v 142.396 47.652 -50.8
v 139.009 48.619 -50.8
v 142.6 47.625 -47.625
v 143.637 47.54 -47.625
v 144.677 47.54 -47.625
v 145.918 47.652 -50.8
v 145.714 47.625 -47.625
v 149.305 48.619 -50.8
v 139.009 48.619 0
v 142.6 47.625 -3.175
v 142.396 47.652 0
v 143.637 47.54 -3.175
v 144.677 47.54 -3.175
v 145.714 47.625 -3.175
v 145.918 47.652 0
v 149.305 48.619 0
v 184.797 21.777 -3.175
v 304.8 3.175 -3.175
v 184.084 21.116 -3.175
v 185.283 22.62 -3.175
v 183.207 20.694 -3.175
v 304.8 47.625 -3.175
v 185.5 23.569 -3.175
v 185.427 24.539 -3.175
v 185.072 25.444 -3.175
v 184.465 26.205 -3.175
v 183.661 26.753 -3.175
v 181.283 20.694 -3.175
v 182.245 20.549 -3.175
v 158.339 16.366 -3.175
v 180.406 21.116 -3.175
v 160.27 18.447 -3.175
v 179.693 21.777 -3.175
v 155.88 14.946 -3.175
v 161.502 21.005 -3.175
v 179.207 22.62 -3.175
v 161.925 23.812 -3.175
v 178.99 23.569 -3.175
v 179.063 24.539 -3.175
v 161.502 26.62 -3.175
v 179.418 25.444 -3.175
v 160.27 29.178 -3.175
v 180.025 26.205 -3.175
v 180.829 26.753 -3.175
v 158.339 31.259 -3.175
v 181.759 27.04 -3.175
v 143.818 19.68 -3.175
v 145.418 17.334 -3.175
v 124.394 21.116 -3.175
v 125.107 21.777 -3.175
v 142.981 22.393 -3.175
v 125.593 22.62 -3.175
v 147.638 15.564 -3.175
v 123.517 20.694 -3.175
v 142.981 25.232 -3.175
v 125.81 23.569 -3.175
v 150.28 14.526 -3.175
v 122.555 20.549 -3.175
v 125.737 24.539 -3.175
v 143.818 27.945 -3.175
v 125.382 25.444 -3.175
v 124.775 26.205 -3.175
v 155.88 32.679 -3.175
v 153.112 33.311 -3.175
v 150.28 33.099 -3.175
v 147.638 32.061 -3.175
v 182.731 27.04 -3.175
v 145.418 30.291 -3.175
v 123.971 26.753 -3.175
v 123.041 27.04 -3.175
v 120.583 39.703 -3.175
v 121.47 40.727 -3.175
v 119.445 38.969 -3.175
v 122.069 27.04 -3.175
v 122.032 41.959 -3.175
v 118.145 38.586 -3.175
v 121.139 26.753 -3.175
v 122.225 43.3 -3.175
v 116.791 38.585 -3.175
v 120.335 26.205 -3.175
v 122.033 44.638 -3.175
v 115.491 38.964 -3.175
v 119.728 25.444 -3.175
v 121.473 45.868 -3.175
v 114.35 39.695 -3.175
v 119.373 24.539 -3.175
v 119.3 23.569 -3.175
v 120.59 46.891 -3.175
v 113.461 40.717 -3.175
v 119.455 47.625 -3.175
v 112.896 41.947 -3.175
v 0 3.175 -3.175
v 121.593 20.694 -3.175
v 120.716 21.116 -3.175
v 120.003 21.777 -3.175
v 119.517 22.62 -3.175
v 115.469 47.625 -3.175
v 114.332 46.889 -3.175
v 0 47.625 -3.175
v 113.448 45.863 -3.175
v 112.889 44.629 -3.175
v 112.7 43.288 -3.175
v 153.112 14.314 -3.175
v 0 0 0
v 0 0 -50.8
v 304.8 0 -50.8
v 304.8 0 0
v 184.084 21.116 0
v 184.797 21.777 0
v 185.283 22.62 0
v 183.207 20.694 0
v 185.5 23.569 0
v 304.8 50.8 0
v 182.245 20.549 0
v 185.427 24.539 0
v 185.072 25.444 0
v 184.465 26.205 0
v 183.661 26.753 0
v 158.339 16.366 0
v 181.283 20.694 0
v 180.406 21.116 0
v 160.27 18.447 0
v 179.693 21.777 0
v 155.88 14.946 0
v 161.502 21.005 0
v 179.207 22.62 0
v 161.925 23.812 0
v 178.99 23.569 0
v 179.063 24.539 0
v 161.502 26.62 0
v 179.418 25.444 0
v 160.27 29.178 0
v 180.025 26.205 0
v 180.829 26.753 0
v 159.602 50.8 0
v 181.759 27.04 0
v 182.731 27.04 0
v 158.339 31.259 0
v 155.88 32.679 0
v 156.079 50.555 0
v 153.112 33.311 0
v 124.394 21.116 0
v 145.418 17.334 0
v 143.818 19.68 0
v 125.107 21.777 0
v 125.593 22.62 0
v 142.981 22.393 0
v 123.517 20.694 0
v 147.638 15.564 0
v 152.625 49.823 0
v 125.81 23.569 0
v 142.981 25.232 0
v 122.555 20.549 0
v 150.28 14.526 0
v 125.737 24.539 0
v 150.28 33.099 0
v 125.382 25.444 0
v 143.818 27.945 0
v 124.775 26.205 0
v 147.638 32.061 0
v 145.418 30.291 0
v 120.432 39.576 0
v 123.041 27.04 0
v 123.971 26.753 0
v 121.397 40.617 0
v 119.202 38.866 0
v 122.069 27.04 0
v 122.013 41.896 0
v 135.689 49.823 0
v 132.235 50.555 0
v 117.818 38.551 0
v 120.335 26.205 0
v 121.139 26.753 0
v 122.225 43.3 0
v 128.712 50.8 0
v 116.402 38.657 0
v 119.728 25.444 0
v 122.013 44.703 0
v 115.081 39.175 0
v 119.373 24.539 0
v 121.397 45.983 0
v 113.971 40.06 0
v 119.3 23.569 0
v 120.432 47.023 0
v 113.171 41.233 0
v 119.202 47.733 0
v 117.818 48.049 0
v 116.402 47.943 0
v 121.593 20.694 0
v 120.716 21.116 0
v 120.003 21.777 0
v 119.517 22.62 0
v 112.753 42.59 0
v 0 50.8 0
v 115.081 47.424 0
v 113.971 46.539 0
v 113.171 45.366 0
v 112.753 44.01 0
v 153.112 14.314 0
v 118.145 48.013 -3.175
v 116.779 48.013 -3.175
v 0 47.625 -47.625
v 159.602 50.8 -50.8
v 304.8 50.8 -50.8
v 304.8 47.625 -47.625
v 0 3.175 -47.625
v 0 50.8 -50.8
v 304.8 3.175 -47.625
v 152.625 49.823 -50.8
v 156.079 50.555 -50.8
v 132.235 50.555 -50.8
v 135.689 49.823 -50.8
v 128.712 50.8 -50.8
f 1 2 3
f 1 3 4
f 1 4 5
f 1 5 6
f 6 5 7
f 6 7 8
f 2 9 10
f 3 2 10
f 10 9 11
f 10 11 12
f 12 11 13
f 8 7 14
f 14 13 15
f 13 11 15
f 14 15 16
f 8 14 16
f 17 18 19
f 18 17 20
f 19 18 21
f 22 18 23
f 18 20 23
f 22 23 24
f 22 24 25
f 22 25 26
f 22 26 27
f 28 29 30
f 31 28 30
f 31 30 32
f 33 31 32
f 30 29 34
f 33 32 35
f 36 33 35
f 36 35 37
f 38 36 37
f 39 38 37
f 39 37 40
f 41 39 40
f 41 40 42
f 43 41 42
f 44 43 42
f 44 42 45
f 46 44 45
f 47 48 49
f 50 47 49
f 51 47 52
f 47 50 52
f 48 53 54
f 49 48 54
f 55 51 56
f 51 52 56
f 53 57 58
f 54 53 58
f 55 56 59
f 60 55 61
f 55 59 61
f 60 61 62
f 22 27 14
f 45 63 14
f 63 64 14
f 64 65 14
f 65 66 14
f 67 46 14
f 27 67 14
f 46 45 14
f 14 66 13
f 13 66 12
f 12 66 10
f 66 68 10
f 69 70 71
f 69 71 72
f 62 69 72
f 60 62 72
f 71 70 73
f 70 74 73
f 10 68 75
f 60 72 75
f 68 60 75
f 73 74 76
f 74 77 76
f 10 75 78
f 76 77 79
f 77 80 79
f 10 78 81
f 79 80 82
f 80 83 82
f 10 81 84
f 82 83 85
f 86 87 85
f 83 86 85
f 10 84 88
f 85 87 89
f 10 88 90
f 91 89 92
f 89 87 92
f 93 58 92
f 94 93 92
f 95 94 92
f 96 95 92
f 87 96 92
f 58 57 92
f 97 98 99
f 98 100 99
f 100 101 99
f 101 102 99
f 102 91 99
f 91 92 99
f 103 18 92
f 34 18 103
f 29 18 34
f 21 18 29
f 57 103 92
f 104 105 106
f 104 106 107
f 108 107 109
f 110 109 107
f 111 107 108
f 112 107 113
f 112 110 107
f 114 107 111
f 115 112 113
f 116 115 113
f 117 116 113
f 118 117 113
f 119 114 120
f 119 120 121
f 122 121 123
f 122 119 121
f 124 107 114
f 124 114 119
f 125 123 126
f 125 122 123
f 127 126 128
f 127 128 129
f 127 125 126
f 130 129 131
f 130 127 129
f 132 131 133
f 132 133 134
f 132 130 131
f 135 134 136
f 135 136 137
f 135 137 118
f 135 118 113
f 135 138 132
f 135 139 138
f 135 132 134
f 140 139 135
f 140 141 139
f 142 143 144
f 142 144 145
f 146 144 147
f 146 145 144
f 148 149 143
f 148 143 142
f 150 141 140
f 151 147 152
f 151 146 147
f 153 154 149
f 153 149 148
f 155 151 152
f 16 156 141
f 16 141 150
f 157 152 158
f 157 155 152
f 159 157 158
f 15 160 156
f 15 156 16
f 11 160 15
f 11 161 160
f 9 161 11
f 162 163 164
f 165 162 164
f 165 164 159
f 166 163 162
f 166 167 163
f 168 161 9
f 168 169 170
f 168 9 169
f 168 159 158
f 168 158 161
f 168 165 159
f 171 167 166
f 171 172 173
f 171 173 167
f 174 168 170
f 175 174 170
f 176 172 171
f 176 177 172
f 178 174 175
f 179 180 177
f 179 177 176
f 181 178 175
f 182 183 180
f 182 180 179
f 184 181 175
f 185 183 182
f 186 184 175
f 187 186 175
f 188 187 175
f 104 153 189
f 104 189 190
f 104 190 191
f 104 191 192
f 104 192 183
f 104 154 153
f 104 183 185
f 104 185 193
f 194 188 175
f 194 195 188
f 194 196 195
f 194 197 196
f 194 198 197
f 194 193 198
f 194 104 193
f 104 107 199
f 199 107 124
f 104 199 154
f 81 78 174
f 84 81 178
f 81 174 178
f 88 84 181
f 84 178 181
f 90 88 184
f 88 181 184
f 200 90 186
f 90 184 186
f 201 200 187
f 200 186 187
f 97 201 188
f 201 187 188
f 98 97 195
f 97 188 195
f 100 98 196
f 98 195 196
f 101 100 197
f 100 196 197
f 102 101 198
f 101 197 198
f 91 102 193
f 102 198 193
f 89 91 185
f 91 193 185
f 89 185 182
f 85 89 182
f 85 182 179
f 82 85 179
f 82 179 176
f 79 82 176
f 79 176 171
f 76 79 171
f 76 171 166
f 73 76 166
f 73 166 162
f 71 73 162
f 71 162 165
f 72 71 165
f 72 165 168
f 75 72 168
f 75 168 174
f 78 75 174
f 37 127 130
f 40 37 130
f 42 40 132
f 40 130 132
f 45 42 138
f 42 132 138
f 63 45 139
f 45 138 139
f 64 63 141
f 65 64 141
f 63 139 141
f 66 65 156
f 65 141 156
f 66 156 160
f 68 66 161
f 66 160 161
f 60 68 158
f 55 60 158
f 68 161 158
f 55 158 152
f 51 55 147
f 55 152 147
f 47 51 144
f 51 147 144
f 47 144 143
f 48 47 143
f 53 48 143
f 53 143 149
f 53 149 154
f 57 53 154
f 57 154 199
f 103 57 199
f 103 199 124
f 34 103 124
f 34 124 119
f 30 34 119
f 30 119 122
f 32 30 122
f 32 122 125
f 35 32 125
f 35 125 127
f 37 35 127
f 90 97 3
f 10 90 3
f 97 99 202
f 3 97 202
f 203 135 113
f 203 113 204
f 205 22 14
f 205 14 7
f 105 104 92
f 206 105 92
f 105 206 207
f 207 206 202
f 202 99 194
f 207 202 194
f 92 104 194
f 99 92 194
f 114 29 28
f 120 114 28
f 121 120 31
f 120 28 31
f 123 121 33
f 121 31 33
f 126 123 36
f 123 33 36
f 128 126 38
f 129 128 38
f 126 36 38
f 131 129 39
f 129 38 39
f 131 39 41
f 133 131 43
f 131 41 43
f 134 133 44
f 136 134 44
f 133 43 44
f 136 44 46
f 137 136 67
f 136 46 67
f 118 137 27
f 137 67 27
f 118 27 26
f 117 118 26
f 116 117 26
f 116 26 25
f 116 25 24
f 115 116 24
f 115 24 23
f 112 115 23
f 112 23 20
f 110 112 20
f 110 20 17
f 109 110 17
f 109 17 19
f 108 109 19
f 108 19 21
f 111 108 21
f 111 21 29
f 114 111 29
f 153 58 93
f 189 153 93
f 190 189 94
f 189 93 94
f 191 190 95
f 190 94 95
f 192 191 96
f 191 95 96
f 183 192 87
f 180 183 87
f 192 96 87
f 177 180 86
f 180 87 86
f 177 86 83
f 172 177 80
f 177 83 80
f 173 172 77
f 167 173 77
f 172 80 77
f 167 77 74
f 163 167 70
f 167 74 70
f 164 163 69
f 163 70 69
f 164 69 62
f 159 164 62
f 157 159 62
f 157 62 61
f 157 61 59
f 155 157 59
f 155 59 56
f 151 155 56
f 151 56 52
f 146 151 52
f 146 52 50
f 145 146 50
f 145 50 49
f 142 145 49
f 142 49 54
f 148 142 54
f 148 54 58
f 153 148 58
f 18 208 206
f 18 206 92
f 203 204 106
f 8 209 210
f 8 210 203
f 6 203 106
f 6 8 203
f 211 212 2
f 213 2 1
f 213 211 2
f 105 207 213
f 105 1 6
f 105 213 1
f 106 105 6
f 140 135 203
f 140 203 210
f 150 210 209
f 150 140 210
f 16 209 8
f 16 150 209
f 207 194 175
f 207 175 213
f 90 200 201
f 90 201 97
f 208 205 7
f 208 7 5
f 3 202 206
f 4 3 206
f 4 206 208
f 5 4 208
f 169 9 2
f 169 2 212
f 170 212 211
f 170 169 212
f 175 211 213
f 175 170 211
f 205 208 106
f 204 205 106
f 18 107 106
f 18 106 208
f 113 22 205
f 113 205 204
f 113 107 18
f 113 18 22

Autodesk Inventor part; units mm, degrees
ref_plane "YZ Plane" through (0, 0, 0) normal (1, 0, 0) x (0, 1, 0)
ref_plane "XZ Plane" through (0, 0, 0) normal (0, 1, 0) x (-1, 0, 0)
ref_plane "XY Plane" through (0, 0, 0) normal (0, 0, 1) x (1, 0, 0)
sketch "Main Outline" plane through (0, 0, 0) normal (0, 0, 1) x (1, 0, 0)
  line L0 (0, 0) -> (304.8, 0) construction
  line L1 (304.8, 0) -> (304.8, 50.8) construction
  line L2 (304.8, 50.8) -> (0, 50.8) construction
  line L3 (0, 50.8) -> (0, 0) construction
  line L4 (0, 50.8) -> (0, 53.34) construction
  line L5 (0, 53.34) -> (304.8, 53.34) construction
  line L6 (304.8, 53.34) -> (304.8, 50.8) construction
  circle A0 centre (152.4, 23.8125) radius 17.4625 construction
  line L7 (152.4, 23.8125) -> (152.4, 0) construction
  circle A1 centre (152.4, 23.8125) radius 27.94 construction
  circle A2 centre (152.4, 23.8125) radius 21.59 construction
  line L8 (152.4, 23.8125) -> (144.1569, 60.2292) construction
  circle A3 centre (144.1569, 60.2292) radius 15.24 construction
  circle A4 centre (144.1569, 60.2292) radius 8.89 construction
  circle A5 centre (144.1569, 60.2292) radius 14.2875 construction
  arc A6 (163.8162, 72.0089) -> (128.198, 43.7805) centre (144.1569, 60.2292) ccw construction
  circle A7 centre (98.8106, 85.598) radius 32.258 construction
  circle A8 centre (124.5097, 147.0273) radius 32.258 construction
  circle A9 centre (174.158, 102.6533) radius 32.258 construction
  circle A10 centre (144.1569, 60.2292) radius 11.1125 construction
  circle A11 centre (152.4, 23.8125) radius 49.53 construction
  line L9 (144.1569, 60.2292) -> (124.5097, 147.0273) construction
  line L10 (144.1569, 60.2292) -> (98.8106, 85.598) construction
  line L11 (98.8106, 85.598) -> (174.158, 102.6533) construction
  line L12 (174.158, 102.6533) -> (144.1569, 60.2292) construction
  circle A12 centre (98.8106, 85.598) radius 9.5493 construction
  arc A13 (172.0498, 111.9669) -> (183.1109, 99.3313) centre (174.158, 102.6533) ccw construction
  circle A14 centre (124.5097, 147.0273) radius 9.5493 construction
  line L13 (96.7024, 94.9117) -> (172.0498, 111.9669) construction
  line L14 (183.1109, 99.3313) -> (165.6438, 52.2565) construction
  line L15 (92.161, 78.7444) -> (128.198, 43.7805) construction
  line L16 (172.0498, 111.9669) -> (174.158, 102.6533) construction
  line L17 (174.158, 102.6533) -> (183.1109, 99.3313) construction
  arc A15 (183.1109, 99.3313) -> (172.0498, 111.9669) centre (174.158, 102.6533) ccw construction
  arc A16 (165.6438, 52.2565) -> (163.8162, 72.0089) centre (144.1569, 60.2292) ccw construction
  arc A17 (128.198, 43.7805) -> (165.6438, 52.2565) centre (144.1569, 60.2292) ccw construction
  circle A18 centre (124.4396, 147.337) radius 32.258 construction
  circle A19 centre (124.3695, 147.6466) radius 32.258 construction
  circle A20 centre (124.2994, 147.9563) radius 32.258 construction
  line L18 (124.5097, 147.0273) -> (124.2994, 147.9563) construction
  circle A21 centre (124.5798, 146.7176) radius 32.258 construction
  circle A22 centre (117.4622, 43.2997) radius 9.525 construction
  circle A23 centre (175.54, 56.4459) radius 9.525 construction
  line L19 (152.4, 23.8125) -> (117.4622, 43.2997) construction
  line L20 (152.4, 23.8125) -> (175.54, 56.4459) construction
  line L21 (117.4622, 43.2997) -> (98.8106, 85.598) construction
  line L22 (175.54, 56.4459) -> (174.158, 102.6533) construction
  circle A24 centre (133.7342, 106.2753) radius 7.9375 construction
  line L23 (133.401, 150.5107) -> (165.496, 68.5894) construction
  circle A25 centre (152.4, 23.8125) radius 29.845 construction
  line L24 (114.985, 146.3422) -> (121.2977, 58.5849) construction
  circle A26 centre (99.0876, 85.443) radius 32.258 construction
  circle A27 centre (97.9793, 86.063) radius 32.258 construction
  line L25 (97.9793, 86.063) -> (98.8106, 85.598) construction
  circle A28 centre (98.2564, 85.908) radius 32.258 construction
  circle A29 centre (98.5335, 85.753) radius 32.258 construction
  circle A30 centre (152.4, 23.8125) radius 29.845 construction
  circle A31 centre (122.555, 23.8125) radius 6.35 construction
  circle A32 centre (179.3358, 36.6651) radius 6.35 construction
  line L26 (122.555, 23.8125) -> (152.4, 23.8125) construction
  line L27 (152.4, 23.8125) -> (182.245, 23.8125) construction
  circle A33 centre (182.245, 23.8125) radius 6.35 construction
  circle A34 centre (125.4642, 10.9599) radius 6.35 construction
  circle A35 centre (150.1885, 33.5827) radius 39.8623 construction
  line L28 (72.8944, 65.7819) -> (119.1902, 8.5205) construction
  circle A36 centre (174.708, 103.431) radius 32.258 construction
  line L29 (174.158, 102.6533) -> (174.708, 103.431) construction
  circle A37 centre (174.5246, 103.1717) radius 32.258 construction
  circle A38 centre (174.3413, 102.9125) radius 32.258 construction
  circle A39 centre (173.9747, 102.394) radius 32.258 construction
  line L30 (188.958, 24.3128) -> (206.0816, 95.9295) construction
  circle A40 centre (133.7342, 106.2753) radius 8.1693 construction
  arc A41 (85.4541, 115.7901) -> (94.2274, 135.7949) centre (79.2901, 130.4196) ccw construction
  arc A42 (156.6774, 149.9308) -> (173.2104, 135.6542) centre (172.4734, 151.5121) ccw construction
  line L31 (124.2994, 147.9563) -> (124.8602, 145.479) construction
  line L32 (114.3901, 145.7133) -> (114.9509, 143.236) construction
  line L33 (134.7695, 147.722) -> (134.2088, 150.1993) construction
  arc A43 (134.2088, 150.1993) -> (114.3901, 145.7133) centre (124.2994, 147.9563) ccw construction
  arc A44 (114.9509, 143.236) -> (134.7695, 147.722) centre (124.8602, 145.479) ccw construction
  line L34 (174.708, 103.431) -> (173.2414, 101.3571) construction
  line L35 (166.4126, 109.2972) -> (164.9461, 107.2234) construction
  line L36 (181.5368, 95.4909) -> (183.0033, 97.5647) construction
  arc A45 (183.0033, 97.5647) -> (166.4126, 109.2972) centre (174.708, 103.431) ccw construction
  arc A46 (164.9461, 107.2234) -> (181.5368, 95.4909) centre (173.2414, 101.3571) ccw construction
  line L37 (97.9793, 86.063) -> (100.196, 84.8229) construction
  line L38 (93.0188, 77.1963) -> (95.2355, 75.9562) construction
  line L39 (105.1564, 93.6897) -> (102.9398, 94.9298) construction
  arc A47 (102.9398, 94.9298) -> (93.0188, 77.1963) centre (97.9793, 86.063) ccw construction
  arc A48 (95.2355, 75.9562) -> (105.1564, 93.6897) centre (100.196, 84.8229) ccw construction
  circle A49 centre (117.4622, 43.2997) radius 3.9687 construction
  circle A50 centre (175.54, 56.4459) radius 3.9687 construction
  line L40 (152.4, 23.8125) -> (158.9889, -5.2961) construction
  arc A51 (89.3511, 54.6895) -> (85.9237, 49.6664) centre (88.3927, 51.6626) ccw construction
  arc A52 (201.2624, 75.7739) -> (196.006, 78.8314) centre (198.1744, 76.5122) ccw construction
  circle A53 centre (152.4, 23.8125) radius 14.224 construction
  circle A54 centre (133.7342, 106.2753) radius 3.9687 construction
  circle A55 centre (156.886, 3.9939) radius 6.35 construction
  circle A56 centre (156.886, 3.9939) radius 2.0828 construction
  circle A57 centre (152.4, 23.8125) radius 20.32 construction
  line L41 (132.9935, 29.8368) -> (152.4, 23.8125) construction
  line L42 (152.4, 23.8125) -> (167.3204, 37.6068) construction
  circle A58 centre (167.3204, 37.6068) radius 2.0828 construction
  circle A59 centre (167.3204, 37.6068) radius 3.9687 construction
  circle A60 centre (132.9935, 29.8368) radius 2.0828 construction
  circle A61 centre (132.9935, 29.8368) radius 3.9688 construction
  point P0 (173.9747, 102.394)
  point P1 (99.0876, 85.443)
  dimension "d18" = 99.06
  dimension "d58" = 64.516
  dimension "d86" = 64.516
  dimension "d0" = 304.8
  dimension "d1" = 50.8
  dimension "d2" = 2.54
  dimension "d3" = 34.925
  dimension "d4" = 23.8125
  dimension "d5" = 152.4
  dimension "d6" = 55.88
  dimension "d7" = 43.18
  dimension "d8" = 37.338
  dimension "d10" = 30.48
  dimension "d11" = 17.78
  dimension "d12" = 28.575
  dimension "d13" = 45.8366
  dimension "d14" = 64.516
  dimension "d15" = 64.516
  dimension "d16" = 64.516
  dimension "d17" = 22.225
  dimension "d19" = 51.9602
  dimension "d20" = 88.9939
  dimension "d21" = 19.0986
  dimension "d22" = 19.0986
  dimension "d23" = 19.0986
  dimension "d30" = 123.112
  dimension "d40" = 64.516
  dimension "d41" = 64.516
  dimension "d42" = 64.516
  dimension "d43" = 0.9525
  dimension "d44" = 0.3175
  dimension "d45" = 0.635
  dimension "d46" = 64.516
  dimension "d47" = 0.3175
  dimension "d48" = 19.05
  dimension "d49" = 19.05
  dimension "d50" = 40.005
  dimension "d51" = 40.005
  dimension "d52" = 46.228
  dimension "d54" = 46.228
  dimension "d55" = 15.875
  dimension "d56" = 41.4655
  dimension "d57" = 59.69
  dimension "d59" = 64.516
  dimension "d60" = 64.516
  dimension "d61" = 64.516
  dimension "d62" = 0.3175
  dimension "d63" = 0.3175
  dimension "d64" = 0.635
  dimension "d65" = 0.9525
  dimension "d73" = 12.7
  dimension "d74" = 12.7
  dimension "d76" = 59.69
  dimension "d78" = 12.7
  dimension "d79" = 12.7
  dimension "d80" = 64.516
  dimension "d81" = 0.9525
  dimension "d82" = 64.516
  dimension "d83" = 64.516
  dimension "d84" = 0.3175
  dimension "d85" = 0.635
  dimension "d88" = 0.3175
  dimension "d89" = 31.75
  dimension "d90" = 31.75
  dimension "d94" = 1.5875
  dimension "d95" = 20.32
  dimension "d96" = 1.5875
sketch "Upper CIM C-C Check" plane through (0, 0, 0) normal (0, 0, 1) x (1, 0, 0)
  arc A0 (3.4429, -22.6582) -> (3.4429, 22.6582) centre (0, 0) ccw construction
  arc A1 (90.4285, 9.4409) -> (90.4285, -9.4409) centre (88.9939, 0) ccw construction
  line L0 (88.9939, 0) -> (0, 0) construction
  line L1 (90.4285, 9.4409) -> (3.4429, 22.6582)
  line L2 (3.4429, -22.6582) -> (90.4285, -9.4409)
  arc A2 (90.4285, -9.4409) -> (90.4285, 9.4409) centre (88.9939, 0) ccw
  arc A3 (3.4429, 22.6582) -> (3.4429, -22.6582) centre (0, 0) ccw
  dimension "d24" = 45.8366
  dimension "d25" = 19.0986
  dimension "d26" = 78.9119
  dimension "d27" = 87.984
  dimension "d28" = 27.12
  dimension "d29" = 88.9939
sketch "Sketch3" plane through (0, 0, 0) normal (1, 0, 0) x (0, 1, 0)
  line L0 (0, 0) -> (50.8, 0)
  line L1 (50.8, 0) -> (50.8, -50.8)
  line L2 (50.8, -50.8) -> (0, -50.8)
  line L3 (0, -50.8) -> (0, 0)
  line L4 (3.175, -3.175) -> (47.625, -3.175)
  line L5 (47.625, -3.175) -> (47.625, -47.625)
  line L6 (47.625, -47.625) -> (3.175, -47.625)
  line L7 (3.175, -47.625) -> (3.175, -3.175)
  dimension "d115" = 50.8
  dimension "d116" = 50.8
  dimension "d117" = 44.45
  dimension "d118" = 44.45
  dimension "d119" = 3.175
  dimension "d120" = 3.175
extrude "Extrusion1" add sketch "Sketch3" along normal blind 304.8
sketch "Sketch4" plane through (0, 0, 0) normal (0, 0, 1) x (1, 0, 0)
  circle A0 centre (152.4, 23.8125) radius 9.525
  circle A1 centre (117.4622, 43.2997) radius 4.7625
  circle A2 centre (144.1569, 60.2292) radius 12.7
  point P0 (0, 0)
  point P1 (122.555, 23.8125)
  point P2 (125.4642, 10.9599)
  point P3 (182.245, 23.8125)
  point P4 (179.3358, 36.6651)
  dimension "d123" = 19.05
  dimension "d124" = 9.525
  dimension "d134" = 25.4
extrude "Extrusion2" cut sketch "Sketch4" against normal up to surface (3.175 mm away) contours A0 | A1
hole "Hole1" at (122.555, 23.8125, 0) at (182.245, 23.8125, 0) direction (0, 0, -1) diameter 6.5278 end up to surface clearance for "Flat Head Machine Screw (82)" size "1/4" standard "Ansi Unified Screw Threads"
extrude "Extrusion3" cut sketch "Sketch4" against normal up to surface (50.8 mm away) contours A2
fillet "Fillet1" radius 25.4 2 edges at (135.6493, 50.8, -25.4) (152.6645, 50.8, -25.4)
equation "\"d3\" = r10"
equation "\"d6\" = g44"
equation "\"d7\" = g34"
equation "\"d10\" = g24"
equation "\"d11\" = g14"
equation "\"d12\" = r8"
equation "\"d13\" = p48"
equation "\"d14\" = cim"
equation "\"d15\" = cim"
equation "\"d16\" = cim"
equation "\"d17\" = r6"
equation "\"d21\" = p20"
equation "\"d22\" = p20"
equation "\"d23\" = p20"
equation "\"d24\" = p48"
equation "\"d25\" = p20"
equation "\"d29\" = d20"
equation "\"g14\" = 17.78"
equation "\"g24\" = 30.48"
equation "\"g34\" = 43.18"
equation "\"g44\" = 55.88"
equation "\"p20\" = 19.09859"
equation "\"p48\" = 45.83662"
equation "\"r10\" = 34.925"
equation "\"r9\" = 31.75"
equation "\"r8\" = 28.575"
equation "\"r7\" = 25.4"
equation "\"r6\" = 22.225"
equation "\"r5\" = 19.05"
equation "\"r4\" = 15.875"
equation "\"r3\" = 12.7"
equation "\"cim\" = 64.516"
equation "\"act\" = 28.448"
equation "\"actL\" = 23.749"
equation "\"UpperCimCCCheck\" = 2 * d27 + d26 + d28"
equation "\"LowerBeltPathCCCheck\" = 267"
properties material "Aluminum 6061"
